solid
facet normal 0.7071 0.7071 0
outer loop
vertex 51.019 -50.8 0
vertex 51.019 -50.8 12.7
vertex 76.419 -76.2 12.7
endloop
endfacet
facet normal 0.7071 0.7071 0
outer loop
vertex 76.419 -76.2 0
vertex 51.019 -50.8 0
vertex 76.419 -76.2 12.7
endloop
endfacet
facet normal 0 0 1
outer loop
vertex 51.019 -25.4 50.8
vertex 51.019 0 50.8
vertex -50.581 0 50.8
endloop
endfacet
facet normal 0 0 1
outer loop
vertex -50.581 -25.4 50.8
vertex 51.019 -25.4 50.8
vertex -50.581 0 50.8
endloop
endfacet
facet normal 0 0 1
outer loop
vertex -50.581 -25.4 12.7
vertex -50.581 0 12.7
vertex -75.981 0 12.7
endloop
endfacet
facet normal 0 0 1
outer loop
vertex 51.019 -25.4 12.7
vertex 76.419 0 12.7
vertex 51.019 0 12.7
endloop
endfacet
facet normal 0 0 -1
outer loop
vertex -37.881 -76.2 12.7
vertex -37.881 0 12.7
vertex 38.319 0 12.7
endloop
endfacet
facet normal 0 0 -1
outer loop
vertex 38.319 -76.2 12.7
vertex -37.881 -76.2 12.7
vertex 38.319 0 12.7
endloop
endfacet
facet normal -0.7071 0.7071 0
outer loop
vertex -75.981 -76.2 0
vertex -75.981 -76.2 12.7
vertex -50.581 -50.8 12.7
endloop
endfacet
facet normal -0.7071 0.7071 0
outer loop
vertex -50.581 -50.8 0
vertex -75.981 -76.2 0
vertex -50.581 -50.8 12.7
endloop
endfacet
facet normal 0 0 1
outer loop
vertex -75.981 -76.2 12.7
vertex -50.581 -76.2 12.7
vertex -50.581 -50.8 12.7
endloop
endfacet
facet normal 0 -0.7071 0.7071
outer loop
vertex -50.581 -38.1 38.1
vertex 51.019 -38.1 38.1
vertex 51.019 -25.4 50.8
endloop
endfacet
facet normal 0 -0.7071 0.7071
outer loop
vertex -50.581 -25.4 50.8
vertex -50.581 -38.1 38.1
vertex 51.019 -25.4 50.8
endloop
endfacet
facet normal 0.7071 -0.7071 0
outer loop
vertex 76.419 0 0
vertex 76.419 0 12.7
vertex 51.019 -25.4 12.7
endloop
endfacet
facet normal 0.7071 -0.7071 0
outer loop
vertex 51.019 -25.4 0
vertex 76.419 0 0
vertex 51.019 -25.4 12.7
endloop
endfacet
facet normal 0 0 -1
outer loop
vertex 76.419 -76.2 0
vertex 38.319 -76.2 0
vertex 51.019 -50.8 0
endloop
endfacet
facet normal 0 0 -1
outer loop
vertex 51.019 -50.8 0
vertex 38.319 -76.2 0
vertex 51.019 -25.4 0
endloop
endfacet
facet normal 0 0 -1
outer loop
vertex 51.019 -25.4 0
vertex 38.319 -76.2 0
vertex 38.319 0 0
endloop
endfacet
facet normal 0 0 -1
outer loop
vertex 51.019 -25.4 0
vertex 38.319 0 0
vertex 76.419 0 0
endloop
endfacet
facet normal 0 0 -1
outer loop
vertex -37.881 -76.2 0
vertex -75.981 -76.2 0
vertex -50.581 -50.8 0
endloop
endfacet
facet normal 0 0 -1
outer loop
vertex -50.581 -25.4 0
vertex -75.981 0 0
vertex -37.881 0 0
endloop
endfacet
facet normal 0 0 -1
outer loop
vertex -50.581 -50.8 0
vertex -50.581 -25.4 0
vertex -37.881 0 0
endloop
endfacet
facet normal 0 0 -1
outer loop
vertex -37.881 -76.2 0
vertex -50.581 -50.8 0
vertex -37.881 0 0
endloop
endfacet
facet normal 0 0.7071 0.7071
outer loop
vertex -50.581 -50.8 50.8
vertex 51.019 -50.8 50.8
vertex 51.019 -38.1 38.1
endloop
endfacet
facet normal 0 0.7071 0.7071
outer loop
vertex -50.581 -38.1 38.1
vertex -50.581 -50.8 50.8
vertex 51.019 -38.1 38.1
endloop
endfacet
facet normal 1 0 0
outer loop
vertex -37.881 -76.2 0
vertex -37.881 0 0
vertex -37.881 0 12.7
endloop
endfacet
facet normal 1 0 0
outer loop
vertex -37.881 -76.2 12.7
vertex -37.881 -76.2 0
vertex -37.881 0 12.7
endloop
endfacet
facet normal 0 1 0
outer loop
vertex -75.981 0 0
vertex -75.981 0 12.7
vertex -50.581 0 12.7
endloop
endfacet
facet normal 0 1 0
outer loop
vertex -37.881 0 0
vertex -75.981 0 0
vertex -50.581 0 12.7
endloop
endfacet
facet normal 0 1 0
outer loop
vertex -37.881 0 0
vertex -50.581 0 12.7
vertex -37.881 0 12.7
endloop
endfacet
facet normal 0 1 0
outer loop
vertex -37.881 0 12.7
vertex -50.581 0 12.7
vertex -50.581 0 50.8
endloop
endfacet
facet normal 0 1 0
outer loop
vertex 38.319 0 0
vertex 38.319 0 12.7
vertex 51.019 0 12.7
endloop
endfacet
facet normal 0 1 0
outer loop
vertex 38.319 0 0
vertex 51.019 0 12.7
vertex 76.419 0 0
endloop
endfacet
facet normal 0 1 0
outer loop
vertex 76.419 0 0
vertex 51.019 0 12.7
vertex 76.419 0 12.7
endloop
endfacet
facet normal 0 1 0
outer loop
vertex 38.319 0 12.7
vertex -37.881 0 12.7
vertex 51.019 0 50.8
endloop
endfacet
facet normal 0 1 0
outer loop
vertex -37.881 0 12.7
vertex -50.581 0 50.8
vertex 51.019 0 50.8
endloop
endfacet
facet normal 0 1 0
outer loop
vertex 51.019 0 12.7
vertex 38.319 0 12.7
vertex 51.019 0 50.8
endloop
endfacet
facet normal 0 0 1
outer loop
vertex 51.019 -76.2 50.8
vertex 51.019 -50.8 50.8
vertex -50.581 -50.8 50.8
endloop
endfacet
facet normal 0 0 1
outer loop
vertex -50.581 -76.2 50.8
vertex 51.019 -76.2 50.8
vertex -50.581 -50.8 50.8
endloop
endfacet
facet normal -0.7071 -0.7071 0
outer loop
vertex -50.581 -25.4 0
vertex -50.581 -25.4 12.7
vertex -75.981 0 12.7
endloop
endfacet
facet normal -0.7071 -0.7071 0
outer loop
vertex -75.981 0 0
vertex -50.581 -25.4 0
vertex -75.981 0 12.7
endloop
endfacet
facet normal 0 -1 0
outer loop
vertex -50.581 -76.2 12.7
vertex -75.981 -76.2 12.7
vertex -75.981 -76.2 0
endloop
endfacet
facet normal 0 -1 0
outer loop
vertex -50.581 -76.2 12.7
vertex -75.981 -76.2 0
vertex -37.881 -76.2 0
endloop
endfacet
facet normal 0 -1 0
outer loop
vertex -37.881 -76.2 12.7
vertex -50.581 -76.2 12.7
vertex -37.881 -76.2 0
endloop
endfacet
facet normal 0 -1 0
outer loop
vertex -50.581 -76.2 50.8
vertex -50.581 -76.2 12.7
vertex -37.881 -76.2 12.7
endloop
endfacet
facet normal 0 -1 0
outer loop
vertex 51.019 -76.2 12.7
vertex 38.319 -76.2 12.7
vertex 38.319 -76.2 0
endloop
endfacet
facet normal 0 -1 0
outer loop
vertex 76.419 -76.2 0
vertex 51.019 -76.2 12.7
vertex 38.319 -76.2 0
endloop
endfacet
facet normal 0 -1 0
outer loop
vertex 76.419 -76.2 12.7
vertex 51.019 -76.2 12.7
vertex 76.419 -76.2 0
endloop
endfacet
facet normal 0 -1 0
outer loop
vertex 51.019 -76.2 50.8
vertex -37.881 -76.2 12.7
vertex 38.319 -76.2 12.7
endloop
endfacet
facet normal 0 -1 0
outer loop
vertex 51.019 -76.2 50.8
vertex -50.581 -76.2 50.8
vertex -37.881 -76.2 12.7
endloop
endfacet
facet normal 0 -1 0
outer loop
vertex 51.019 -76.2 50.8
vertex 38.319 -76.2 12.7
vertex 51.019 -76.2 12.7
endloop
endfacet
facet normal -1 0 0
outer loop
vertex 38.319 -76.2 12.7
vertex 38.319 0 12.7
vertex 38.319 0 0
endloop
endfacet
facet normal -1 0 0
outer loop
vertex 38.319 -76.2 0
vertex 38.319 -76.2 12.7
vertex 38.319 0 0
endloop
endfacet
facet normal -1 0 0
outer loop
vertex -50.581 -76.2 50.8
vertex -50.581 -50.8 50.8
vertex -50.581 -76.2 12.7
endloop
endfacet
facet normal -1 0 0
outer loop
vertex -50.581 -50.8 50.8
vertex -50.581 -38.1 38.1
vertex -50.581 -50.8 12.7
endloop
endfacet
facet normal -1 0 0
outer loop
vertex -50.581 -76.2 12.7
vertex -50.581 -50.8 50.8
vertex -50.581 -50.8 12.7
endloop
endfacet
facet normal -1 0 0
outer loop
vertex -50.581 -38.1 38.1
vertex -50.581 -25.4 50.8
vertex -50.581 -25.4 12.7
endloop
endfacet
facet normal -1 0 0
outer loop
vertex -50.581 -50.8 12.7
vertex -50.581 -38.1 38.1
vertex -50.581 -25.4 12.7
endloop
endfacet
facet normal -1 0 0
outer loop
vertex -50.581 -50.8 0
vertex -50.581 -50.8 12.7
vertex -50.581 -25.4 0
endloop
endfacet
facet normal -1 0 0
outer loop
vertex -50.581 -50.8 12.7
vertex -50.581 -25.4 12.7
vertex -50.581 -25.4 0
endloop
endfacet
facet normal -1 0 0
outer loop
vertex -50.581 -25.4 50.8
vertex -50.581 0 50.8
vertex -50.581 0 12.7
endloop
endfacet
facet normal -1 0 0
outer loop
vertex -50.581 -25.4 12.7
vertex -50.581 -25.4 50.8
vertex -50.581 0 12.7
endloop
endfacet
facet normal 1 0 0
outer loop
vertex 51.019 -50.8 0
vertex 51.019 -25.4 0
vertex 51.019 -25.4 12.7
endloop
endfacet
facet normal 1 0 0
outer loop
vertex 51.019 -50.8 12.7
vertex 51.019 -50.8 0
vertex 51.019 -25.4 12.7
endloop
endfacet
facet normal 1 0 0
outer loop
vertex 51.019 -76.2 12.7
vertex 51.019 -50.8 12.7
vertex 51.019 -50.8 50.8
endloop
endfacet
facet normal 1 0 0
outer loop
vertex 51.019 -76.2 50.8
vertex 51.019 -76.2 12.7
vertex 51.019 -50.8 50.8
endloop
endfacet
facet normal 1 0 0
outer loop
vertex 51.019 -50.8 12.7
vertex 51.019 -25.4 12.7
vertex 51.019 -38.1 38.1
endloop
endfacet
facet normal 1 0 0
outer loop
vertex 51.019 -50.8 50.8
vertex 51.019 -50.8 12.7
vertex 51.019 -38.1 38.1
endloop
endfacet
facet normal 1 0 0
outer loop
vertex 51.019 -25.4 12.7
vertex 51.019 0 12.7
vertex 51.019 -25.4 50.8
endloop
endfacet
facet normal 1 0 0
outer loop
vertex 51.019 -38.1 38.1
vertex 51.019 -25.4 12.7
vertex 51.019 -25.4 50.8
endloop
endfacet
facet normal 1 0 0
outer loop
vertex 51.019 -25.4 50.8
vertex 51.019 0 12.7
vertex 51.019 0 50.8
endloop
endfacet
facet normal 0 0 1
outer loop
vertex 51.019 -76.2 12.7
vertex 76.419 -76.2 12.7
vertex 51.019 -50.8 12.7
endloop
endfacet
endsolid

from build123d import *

# Parameters (mm, degrees)
F1_DEPTH = 76.2
F3_DEPTH = 101.6
F5_DEPTH = 25.4
F7_DEPTH = 25.4


with BuildPart() as f1:
    # F0 (on Front) → F1 (new body)
    with BuildSketch(Plane.XZ):
        Polygon((-75.980723, 12.7), (-75.980723, 0), (-37.880723, 0), (-37.880723, 12.7), (-50.580723, 12.7), align=None)
        Polygon((-50.580723, 12.7), (-37.880723, 12.7), (38.319277, 12.7), (51.019277, 12.7), (51.019277, 50.8), (-50.580723, 50.8), align=None)
        Polygon((51.019277, 12.7), (38.319277, 12.7), (38.319277, 0), (76.419277, 0), (76.419277, 12.7), align=None)
    extrude(amount=F1_DEPTH)

    # F2 (on face) → F3 (cut)
    with BuildSketch(Plane.YZ.offset(51.019277)):
        Polygon((-38.1, 50.8), (-50.8, 50.8), (-38.1, 38.1), align=None)
        Polygon((-38.1, 50.8), (-38.1, 38.1), (-25.4, 50.8), align=None)
    extrude(amount=-F3_DEPTH, mode=Mode.SUBTRACT)

    # F4 (on face) → F5 (cut)
    with BuildSketch(Plane.XY.offset(12.7)):
        Polygon((51.019277, -25.4), (51.019277, -50.8), (76.419277, -76.2), (76.419277, 0), align=None)
    extrude(amount=-F5_DEPTH, mode=Mode.SUBTRACT)

    # F6 (on face) → F7 (cut)
    with BuildSketch(Plane.XY.offset(12.7)):
        Polygon((-50.580723, -50.8), (-50.580723, -25.4), (-75.980723, 0), (-75.980723, -76.2), align=None)
    extrude(amount=-F7_DEPTH, mode=Mode.SUBTRACT)


solid = f1.part
